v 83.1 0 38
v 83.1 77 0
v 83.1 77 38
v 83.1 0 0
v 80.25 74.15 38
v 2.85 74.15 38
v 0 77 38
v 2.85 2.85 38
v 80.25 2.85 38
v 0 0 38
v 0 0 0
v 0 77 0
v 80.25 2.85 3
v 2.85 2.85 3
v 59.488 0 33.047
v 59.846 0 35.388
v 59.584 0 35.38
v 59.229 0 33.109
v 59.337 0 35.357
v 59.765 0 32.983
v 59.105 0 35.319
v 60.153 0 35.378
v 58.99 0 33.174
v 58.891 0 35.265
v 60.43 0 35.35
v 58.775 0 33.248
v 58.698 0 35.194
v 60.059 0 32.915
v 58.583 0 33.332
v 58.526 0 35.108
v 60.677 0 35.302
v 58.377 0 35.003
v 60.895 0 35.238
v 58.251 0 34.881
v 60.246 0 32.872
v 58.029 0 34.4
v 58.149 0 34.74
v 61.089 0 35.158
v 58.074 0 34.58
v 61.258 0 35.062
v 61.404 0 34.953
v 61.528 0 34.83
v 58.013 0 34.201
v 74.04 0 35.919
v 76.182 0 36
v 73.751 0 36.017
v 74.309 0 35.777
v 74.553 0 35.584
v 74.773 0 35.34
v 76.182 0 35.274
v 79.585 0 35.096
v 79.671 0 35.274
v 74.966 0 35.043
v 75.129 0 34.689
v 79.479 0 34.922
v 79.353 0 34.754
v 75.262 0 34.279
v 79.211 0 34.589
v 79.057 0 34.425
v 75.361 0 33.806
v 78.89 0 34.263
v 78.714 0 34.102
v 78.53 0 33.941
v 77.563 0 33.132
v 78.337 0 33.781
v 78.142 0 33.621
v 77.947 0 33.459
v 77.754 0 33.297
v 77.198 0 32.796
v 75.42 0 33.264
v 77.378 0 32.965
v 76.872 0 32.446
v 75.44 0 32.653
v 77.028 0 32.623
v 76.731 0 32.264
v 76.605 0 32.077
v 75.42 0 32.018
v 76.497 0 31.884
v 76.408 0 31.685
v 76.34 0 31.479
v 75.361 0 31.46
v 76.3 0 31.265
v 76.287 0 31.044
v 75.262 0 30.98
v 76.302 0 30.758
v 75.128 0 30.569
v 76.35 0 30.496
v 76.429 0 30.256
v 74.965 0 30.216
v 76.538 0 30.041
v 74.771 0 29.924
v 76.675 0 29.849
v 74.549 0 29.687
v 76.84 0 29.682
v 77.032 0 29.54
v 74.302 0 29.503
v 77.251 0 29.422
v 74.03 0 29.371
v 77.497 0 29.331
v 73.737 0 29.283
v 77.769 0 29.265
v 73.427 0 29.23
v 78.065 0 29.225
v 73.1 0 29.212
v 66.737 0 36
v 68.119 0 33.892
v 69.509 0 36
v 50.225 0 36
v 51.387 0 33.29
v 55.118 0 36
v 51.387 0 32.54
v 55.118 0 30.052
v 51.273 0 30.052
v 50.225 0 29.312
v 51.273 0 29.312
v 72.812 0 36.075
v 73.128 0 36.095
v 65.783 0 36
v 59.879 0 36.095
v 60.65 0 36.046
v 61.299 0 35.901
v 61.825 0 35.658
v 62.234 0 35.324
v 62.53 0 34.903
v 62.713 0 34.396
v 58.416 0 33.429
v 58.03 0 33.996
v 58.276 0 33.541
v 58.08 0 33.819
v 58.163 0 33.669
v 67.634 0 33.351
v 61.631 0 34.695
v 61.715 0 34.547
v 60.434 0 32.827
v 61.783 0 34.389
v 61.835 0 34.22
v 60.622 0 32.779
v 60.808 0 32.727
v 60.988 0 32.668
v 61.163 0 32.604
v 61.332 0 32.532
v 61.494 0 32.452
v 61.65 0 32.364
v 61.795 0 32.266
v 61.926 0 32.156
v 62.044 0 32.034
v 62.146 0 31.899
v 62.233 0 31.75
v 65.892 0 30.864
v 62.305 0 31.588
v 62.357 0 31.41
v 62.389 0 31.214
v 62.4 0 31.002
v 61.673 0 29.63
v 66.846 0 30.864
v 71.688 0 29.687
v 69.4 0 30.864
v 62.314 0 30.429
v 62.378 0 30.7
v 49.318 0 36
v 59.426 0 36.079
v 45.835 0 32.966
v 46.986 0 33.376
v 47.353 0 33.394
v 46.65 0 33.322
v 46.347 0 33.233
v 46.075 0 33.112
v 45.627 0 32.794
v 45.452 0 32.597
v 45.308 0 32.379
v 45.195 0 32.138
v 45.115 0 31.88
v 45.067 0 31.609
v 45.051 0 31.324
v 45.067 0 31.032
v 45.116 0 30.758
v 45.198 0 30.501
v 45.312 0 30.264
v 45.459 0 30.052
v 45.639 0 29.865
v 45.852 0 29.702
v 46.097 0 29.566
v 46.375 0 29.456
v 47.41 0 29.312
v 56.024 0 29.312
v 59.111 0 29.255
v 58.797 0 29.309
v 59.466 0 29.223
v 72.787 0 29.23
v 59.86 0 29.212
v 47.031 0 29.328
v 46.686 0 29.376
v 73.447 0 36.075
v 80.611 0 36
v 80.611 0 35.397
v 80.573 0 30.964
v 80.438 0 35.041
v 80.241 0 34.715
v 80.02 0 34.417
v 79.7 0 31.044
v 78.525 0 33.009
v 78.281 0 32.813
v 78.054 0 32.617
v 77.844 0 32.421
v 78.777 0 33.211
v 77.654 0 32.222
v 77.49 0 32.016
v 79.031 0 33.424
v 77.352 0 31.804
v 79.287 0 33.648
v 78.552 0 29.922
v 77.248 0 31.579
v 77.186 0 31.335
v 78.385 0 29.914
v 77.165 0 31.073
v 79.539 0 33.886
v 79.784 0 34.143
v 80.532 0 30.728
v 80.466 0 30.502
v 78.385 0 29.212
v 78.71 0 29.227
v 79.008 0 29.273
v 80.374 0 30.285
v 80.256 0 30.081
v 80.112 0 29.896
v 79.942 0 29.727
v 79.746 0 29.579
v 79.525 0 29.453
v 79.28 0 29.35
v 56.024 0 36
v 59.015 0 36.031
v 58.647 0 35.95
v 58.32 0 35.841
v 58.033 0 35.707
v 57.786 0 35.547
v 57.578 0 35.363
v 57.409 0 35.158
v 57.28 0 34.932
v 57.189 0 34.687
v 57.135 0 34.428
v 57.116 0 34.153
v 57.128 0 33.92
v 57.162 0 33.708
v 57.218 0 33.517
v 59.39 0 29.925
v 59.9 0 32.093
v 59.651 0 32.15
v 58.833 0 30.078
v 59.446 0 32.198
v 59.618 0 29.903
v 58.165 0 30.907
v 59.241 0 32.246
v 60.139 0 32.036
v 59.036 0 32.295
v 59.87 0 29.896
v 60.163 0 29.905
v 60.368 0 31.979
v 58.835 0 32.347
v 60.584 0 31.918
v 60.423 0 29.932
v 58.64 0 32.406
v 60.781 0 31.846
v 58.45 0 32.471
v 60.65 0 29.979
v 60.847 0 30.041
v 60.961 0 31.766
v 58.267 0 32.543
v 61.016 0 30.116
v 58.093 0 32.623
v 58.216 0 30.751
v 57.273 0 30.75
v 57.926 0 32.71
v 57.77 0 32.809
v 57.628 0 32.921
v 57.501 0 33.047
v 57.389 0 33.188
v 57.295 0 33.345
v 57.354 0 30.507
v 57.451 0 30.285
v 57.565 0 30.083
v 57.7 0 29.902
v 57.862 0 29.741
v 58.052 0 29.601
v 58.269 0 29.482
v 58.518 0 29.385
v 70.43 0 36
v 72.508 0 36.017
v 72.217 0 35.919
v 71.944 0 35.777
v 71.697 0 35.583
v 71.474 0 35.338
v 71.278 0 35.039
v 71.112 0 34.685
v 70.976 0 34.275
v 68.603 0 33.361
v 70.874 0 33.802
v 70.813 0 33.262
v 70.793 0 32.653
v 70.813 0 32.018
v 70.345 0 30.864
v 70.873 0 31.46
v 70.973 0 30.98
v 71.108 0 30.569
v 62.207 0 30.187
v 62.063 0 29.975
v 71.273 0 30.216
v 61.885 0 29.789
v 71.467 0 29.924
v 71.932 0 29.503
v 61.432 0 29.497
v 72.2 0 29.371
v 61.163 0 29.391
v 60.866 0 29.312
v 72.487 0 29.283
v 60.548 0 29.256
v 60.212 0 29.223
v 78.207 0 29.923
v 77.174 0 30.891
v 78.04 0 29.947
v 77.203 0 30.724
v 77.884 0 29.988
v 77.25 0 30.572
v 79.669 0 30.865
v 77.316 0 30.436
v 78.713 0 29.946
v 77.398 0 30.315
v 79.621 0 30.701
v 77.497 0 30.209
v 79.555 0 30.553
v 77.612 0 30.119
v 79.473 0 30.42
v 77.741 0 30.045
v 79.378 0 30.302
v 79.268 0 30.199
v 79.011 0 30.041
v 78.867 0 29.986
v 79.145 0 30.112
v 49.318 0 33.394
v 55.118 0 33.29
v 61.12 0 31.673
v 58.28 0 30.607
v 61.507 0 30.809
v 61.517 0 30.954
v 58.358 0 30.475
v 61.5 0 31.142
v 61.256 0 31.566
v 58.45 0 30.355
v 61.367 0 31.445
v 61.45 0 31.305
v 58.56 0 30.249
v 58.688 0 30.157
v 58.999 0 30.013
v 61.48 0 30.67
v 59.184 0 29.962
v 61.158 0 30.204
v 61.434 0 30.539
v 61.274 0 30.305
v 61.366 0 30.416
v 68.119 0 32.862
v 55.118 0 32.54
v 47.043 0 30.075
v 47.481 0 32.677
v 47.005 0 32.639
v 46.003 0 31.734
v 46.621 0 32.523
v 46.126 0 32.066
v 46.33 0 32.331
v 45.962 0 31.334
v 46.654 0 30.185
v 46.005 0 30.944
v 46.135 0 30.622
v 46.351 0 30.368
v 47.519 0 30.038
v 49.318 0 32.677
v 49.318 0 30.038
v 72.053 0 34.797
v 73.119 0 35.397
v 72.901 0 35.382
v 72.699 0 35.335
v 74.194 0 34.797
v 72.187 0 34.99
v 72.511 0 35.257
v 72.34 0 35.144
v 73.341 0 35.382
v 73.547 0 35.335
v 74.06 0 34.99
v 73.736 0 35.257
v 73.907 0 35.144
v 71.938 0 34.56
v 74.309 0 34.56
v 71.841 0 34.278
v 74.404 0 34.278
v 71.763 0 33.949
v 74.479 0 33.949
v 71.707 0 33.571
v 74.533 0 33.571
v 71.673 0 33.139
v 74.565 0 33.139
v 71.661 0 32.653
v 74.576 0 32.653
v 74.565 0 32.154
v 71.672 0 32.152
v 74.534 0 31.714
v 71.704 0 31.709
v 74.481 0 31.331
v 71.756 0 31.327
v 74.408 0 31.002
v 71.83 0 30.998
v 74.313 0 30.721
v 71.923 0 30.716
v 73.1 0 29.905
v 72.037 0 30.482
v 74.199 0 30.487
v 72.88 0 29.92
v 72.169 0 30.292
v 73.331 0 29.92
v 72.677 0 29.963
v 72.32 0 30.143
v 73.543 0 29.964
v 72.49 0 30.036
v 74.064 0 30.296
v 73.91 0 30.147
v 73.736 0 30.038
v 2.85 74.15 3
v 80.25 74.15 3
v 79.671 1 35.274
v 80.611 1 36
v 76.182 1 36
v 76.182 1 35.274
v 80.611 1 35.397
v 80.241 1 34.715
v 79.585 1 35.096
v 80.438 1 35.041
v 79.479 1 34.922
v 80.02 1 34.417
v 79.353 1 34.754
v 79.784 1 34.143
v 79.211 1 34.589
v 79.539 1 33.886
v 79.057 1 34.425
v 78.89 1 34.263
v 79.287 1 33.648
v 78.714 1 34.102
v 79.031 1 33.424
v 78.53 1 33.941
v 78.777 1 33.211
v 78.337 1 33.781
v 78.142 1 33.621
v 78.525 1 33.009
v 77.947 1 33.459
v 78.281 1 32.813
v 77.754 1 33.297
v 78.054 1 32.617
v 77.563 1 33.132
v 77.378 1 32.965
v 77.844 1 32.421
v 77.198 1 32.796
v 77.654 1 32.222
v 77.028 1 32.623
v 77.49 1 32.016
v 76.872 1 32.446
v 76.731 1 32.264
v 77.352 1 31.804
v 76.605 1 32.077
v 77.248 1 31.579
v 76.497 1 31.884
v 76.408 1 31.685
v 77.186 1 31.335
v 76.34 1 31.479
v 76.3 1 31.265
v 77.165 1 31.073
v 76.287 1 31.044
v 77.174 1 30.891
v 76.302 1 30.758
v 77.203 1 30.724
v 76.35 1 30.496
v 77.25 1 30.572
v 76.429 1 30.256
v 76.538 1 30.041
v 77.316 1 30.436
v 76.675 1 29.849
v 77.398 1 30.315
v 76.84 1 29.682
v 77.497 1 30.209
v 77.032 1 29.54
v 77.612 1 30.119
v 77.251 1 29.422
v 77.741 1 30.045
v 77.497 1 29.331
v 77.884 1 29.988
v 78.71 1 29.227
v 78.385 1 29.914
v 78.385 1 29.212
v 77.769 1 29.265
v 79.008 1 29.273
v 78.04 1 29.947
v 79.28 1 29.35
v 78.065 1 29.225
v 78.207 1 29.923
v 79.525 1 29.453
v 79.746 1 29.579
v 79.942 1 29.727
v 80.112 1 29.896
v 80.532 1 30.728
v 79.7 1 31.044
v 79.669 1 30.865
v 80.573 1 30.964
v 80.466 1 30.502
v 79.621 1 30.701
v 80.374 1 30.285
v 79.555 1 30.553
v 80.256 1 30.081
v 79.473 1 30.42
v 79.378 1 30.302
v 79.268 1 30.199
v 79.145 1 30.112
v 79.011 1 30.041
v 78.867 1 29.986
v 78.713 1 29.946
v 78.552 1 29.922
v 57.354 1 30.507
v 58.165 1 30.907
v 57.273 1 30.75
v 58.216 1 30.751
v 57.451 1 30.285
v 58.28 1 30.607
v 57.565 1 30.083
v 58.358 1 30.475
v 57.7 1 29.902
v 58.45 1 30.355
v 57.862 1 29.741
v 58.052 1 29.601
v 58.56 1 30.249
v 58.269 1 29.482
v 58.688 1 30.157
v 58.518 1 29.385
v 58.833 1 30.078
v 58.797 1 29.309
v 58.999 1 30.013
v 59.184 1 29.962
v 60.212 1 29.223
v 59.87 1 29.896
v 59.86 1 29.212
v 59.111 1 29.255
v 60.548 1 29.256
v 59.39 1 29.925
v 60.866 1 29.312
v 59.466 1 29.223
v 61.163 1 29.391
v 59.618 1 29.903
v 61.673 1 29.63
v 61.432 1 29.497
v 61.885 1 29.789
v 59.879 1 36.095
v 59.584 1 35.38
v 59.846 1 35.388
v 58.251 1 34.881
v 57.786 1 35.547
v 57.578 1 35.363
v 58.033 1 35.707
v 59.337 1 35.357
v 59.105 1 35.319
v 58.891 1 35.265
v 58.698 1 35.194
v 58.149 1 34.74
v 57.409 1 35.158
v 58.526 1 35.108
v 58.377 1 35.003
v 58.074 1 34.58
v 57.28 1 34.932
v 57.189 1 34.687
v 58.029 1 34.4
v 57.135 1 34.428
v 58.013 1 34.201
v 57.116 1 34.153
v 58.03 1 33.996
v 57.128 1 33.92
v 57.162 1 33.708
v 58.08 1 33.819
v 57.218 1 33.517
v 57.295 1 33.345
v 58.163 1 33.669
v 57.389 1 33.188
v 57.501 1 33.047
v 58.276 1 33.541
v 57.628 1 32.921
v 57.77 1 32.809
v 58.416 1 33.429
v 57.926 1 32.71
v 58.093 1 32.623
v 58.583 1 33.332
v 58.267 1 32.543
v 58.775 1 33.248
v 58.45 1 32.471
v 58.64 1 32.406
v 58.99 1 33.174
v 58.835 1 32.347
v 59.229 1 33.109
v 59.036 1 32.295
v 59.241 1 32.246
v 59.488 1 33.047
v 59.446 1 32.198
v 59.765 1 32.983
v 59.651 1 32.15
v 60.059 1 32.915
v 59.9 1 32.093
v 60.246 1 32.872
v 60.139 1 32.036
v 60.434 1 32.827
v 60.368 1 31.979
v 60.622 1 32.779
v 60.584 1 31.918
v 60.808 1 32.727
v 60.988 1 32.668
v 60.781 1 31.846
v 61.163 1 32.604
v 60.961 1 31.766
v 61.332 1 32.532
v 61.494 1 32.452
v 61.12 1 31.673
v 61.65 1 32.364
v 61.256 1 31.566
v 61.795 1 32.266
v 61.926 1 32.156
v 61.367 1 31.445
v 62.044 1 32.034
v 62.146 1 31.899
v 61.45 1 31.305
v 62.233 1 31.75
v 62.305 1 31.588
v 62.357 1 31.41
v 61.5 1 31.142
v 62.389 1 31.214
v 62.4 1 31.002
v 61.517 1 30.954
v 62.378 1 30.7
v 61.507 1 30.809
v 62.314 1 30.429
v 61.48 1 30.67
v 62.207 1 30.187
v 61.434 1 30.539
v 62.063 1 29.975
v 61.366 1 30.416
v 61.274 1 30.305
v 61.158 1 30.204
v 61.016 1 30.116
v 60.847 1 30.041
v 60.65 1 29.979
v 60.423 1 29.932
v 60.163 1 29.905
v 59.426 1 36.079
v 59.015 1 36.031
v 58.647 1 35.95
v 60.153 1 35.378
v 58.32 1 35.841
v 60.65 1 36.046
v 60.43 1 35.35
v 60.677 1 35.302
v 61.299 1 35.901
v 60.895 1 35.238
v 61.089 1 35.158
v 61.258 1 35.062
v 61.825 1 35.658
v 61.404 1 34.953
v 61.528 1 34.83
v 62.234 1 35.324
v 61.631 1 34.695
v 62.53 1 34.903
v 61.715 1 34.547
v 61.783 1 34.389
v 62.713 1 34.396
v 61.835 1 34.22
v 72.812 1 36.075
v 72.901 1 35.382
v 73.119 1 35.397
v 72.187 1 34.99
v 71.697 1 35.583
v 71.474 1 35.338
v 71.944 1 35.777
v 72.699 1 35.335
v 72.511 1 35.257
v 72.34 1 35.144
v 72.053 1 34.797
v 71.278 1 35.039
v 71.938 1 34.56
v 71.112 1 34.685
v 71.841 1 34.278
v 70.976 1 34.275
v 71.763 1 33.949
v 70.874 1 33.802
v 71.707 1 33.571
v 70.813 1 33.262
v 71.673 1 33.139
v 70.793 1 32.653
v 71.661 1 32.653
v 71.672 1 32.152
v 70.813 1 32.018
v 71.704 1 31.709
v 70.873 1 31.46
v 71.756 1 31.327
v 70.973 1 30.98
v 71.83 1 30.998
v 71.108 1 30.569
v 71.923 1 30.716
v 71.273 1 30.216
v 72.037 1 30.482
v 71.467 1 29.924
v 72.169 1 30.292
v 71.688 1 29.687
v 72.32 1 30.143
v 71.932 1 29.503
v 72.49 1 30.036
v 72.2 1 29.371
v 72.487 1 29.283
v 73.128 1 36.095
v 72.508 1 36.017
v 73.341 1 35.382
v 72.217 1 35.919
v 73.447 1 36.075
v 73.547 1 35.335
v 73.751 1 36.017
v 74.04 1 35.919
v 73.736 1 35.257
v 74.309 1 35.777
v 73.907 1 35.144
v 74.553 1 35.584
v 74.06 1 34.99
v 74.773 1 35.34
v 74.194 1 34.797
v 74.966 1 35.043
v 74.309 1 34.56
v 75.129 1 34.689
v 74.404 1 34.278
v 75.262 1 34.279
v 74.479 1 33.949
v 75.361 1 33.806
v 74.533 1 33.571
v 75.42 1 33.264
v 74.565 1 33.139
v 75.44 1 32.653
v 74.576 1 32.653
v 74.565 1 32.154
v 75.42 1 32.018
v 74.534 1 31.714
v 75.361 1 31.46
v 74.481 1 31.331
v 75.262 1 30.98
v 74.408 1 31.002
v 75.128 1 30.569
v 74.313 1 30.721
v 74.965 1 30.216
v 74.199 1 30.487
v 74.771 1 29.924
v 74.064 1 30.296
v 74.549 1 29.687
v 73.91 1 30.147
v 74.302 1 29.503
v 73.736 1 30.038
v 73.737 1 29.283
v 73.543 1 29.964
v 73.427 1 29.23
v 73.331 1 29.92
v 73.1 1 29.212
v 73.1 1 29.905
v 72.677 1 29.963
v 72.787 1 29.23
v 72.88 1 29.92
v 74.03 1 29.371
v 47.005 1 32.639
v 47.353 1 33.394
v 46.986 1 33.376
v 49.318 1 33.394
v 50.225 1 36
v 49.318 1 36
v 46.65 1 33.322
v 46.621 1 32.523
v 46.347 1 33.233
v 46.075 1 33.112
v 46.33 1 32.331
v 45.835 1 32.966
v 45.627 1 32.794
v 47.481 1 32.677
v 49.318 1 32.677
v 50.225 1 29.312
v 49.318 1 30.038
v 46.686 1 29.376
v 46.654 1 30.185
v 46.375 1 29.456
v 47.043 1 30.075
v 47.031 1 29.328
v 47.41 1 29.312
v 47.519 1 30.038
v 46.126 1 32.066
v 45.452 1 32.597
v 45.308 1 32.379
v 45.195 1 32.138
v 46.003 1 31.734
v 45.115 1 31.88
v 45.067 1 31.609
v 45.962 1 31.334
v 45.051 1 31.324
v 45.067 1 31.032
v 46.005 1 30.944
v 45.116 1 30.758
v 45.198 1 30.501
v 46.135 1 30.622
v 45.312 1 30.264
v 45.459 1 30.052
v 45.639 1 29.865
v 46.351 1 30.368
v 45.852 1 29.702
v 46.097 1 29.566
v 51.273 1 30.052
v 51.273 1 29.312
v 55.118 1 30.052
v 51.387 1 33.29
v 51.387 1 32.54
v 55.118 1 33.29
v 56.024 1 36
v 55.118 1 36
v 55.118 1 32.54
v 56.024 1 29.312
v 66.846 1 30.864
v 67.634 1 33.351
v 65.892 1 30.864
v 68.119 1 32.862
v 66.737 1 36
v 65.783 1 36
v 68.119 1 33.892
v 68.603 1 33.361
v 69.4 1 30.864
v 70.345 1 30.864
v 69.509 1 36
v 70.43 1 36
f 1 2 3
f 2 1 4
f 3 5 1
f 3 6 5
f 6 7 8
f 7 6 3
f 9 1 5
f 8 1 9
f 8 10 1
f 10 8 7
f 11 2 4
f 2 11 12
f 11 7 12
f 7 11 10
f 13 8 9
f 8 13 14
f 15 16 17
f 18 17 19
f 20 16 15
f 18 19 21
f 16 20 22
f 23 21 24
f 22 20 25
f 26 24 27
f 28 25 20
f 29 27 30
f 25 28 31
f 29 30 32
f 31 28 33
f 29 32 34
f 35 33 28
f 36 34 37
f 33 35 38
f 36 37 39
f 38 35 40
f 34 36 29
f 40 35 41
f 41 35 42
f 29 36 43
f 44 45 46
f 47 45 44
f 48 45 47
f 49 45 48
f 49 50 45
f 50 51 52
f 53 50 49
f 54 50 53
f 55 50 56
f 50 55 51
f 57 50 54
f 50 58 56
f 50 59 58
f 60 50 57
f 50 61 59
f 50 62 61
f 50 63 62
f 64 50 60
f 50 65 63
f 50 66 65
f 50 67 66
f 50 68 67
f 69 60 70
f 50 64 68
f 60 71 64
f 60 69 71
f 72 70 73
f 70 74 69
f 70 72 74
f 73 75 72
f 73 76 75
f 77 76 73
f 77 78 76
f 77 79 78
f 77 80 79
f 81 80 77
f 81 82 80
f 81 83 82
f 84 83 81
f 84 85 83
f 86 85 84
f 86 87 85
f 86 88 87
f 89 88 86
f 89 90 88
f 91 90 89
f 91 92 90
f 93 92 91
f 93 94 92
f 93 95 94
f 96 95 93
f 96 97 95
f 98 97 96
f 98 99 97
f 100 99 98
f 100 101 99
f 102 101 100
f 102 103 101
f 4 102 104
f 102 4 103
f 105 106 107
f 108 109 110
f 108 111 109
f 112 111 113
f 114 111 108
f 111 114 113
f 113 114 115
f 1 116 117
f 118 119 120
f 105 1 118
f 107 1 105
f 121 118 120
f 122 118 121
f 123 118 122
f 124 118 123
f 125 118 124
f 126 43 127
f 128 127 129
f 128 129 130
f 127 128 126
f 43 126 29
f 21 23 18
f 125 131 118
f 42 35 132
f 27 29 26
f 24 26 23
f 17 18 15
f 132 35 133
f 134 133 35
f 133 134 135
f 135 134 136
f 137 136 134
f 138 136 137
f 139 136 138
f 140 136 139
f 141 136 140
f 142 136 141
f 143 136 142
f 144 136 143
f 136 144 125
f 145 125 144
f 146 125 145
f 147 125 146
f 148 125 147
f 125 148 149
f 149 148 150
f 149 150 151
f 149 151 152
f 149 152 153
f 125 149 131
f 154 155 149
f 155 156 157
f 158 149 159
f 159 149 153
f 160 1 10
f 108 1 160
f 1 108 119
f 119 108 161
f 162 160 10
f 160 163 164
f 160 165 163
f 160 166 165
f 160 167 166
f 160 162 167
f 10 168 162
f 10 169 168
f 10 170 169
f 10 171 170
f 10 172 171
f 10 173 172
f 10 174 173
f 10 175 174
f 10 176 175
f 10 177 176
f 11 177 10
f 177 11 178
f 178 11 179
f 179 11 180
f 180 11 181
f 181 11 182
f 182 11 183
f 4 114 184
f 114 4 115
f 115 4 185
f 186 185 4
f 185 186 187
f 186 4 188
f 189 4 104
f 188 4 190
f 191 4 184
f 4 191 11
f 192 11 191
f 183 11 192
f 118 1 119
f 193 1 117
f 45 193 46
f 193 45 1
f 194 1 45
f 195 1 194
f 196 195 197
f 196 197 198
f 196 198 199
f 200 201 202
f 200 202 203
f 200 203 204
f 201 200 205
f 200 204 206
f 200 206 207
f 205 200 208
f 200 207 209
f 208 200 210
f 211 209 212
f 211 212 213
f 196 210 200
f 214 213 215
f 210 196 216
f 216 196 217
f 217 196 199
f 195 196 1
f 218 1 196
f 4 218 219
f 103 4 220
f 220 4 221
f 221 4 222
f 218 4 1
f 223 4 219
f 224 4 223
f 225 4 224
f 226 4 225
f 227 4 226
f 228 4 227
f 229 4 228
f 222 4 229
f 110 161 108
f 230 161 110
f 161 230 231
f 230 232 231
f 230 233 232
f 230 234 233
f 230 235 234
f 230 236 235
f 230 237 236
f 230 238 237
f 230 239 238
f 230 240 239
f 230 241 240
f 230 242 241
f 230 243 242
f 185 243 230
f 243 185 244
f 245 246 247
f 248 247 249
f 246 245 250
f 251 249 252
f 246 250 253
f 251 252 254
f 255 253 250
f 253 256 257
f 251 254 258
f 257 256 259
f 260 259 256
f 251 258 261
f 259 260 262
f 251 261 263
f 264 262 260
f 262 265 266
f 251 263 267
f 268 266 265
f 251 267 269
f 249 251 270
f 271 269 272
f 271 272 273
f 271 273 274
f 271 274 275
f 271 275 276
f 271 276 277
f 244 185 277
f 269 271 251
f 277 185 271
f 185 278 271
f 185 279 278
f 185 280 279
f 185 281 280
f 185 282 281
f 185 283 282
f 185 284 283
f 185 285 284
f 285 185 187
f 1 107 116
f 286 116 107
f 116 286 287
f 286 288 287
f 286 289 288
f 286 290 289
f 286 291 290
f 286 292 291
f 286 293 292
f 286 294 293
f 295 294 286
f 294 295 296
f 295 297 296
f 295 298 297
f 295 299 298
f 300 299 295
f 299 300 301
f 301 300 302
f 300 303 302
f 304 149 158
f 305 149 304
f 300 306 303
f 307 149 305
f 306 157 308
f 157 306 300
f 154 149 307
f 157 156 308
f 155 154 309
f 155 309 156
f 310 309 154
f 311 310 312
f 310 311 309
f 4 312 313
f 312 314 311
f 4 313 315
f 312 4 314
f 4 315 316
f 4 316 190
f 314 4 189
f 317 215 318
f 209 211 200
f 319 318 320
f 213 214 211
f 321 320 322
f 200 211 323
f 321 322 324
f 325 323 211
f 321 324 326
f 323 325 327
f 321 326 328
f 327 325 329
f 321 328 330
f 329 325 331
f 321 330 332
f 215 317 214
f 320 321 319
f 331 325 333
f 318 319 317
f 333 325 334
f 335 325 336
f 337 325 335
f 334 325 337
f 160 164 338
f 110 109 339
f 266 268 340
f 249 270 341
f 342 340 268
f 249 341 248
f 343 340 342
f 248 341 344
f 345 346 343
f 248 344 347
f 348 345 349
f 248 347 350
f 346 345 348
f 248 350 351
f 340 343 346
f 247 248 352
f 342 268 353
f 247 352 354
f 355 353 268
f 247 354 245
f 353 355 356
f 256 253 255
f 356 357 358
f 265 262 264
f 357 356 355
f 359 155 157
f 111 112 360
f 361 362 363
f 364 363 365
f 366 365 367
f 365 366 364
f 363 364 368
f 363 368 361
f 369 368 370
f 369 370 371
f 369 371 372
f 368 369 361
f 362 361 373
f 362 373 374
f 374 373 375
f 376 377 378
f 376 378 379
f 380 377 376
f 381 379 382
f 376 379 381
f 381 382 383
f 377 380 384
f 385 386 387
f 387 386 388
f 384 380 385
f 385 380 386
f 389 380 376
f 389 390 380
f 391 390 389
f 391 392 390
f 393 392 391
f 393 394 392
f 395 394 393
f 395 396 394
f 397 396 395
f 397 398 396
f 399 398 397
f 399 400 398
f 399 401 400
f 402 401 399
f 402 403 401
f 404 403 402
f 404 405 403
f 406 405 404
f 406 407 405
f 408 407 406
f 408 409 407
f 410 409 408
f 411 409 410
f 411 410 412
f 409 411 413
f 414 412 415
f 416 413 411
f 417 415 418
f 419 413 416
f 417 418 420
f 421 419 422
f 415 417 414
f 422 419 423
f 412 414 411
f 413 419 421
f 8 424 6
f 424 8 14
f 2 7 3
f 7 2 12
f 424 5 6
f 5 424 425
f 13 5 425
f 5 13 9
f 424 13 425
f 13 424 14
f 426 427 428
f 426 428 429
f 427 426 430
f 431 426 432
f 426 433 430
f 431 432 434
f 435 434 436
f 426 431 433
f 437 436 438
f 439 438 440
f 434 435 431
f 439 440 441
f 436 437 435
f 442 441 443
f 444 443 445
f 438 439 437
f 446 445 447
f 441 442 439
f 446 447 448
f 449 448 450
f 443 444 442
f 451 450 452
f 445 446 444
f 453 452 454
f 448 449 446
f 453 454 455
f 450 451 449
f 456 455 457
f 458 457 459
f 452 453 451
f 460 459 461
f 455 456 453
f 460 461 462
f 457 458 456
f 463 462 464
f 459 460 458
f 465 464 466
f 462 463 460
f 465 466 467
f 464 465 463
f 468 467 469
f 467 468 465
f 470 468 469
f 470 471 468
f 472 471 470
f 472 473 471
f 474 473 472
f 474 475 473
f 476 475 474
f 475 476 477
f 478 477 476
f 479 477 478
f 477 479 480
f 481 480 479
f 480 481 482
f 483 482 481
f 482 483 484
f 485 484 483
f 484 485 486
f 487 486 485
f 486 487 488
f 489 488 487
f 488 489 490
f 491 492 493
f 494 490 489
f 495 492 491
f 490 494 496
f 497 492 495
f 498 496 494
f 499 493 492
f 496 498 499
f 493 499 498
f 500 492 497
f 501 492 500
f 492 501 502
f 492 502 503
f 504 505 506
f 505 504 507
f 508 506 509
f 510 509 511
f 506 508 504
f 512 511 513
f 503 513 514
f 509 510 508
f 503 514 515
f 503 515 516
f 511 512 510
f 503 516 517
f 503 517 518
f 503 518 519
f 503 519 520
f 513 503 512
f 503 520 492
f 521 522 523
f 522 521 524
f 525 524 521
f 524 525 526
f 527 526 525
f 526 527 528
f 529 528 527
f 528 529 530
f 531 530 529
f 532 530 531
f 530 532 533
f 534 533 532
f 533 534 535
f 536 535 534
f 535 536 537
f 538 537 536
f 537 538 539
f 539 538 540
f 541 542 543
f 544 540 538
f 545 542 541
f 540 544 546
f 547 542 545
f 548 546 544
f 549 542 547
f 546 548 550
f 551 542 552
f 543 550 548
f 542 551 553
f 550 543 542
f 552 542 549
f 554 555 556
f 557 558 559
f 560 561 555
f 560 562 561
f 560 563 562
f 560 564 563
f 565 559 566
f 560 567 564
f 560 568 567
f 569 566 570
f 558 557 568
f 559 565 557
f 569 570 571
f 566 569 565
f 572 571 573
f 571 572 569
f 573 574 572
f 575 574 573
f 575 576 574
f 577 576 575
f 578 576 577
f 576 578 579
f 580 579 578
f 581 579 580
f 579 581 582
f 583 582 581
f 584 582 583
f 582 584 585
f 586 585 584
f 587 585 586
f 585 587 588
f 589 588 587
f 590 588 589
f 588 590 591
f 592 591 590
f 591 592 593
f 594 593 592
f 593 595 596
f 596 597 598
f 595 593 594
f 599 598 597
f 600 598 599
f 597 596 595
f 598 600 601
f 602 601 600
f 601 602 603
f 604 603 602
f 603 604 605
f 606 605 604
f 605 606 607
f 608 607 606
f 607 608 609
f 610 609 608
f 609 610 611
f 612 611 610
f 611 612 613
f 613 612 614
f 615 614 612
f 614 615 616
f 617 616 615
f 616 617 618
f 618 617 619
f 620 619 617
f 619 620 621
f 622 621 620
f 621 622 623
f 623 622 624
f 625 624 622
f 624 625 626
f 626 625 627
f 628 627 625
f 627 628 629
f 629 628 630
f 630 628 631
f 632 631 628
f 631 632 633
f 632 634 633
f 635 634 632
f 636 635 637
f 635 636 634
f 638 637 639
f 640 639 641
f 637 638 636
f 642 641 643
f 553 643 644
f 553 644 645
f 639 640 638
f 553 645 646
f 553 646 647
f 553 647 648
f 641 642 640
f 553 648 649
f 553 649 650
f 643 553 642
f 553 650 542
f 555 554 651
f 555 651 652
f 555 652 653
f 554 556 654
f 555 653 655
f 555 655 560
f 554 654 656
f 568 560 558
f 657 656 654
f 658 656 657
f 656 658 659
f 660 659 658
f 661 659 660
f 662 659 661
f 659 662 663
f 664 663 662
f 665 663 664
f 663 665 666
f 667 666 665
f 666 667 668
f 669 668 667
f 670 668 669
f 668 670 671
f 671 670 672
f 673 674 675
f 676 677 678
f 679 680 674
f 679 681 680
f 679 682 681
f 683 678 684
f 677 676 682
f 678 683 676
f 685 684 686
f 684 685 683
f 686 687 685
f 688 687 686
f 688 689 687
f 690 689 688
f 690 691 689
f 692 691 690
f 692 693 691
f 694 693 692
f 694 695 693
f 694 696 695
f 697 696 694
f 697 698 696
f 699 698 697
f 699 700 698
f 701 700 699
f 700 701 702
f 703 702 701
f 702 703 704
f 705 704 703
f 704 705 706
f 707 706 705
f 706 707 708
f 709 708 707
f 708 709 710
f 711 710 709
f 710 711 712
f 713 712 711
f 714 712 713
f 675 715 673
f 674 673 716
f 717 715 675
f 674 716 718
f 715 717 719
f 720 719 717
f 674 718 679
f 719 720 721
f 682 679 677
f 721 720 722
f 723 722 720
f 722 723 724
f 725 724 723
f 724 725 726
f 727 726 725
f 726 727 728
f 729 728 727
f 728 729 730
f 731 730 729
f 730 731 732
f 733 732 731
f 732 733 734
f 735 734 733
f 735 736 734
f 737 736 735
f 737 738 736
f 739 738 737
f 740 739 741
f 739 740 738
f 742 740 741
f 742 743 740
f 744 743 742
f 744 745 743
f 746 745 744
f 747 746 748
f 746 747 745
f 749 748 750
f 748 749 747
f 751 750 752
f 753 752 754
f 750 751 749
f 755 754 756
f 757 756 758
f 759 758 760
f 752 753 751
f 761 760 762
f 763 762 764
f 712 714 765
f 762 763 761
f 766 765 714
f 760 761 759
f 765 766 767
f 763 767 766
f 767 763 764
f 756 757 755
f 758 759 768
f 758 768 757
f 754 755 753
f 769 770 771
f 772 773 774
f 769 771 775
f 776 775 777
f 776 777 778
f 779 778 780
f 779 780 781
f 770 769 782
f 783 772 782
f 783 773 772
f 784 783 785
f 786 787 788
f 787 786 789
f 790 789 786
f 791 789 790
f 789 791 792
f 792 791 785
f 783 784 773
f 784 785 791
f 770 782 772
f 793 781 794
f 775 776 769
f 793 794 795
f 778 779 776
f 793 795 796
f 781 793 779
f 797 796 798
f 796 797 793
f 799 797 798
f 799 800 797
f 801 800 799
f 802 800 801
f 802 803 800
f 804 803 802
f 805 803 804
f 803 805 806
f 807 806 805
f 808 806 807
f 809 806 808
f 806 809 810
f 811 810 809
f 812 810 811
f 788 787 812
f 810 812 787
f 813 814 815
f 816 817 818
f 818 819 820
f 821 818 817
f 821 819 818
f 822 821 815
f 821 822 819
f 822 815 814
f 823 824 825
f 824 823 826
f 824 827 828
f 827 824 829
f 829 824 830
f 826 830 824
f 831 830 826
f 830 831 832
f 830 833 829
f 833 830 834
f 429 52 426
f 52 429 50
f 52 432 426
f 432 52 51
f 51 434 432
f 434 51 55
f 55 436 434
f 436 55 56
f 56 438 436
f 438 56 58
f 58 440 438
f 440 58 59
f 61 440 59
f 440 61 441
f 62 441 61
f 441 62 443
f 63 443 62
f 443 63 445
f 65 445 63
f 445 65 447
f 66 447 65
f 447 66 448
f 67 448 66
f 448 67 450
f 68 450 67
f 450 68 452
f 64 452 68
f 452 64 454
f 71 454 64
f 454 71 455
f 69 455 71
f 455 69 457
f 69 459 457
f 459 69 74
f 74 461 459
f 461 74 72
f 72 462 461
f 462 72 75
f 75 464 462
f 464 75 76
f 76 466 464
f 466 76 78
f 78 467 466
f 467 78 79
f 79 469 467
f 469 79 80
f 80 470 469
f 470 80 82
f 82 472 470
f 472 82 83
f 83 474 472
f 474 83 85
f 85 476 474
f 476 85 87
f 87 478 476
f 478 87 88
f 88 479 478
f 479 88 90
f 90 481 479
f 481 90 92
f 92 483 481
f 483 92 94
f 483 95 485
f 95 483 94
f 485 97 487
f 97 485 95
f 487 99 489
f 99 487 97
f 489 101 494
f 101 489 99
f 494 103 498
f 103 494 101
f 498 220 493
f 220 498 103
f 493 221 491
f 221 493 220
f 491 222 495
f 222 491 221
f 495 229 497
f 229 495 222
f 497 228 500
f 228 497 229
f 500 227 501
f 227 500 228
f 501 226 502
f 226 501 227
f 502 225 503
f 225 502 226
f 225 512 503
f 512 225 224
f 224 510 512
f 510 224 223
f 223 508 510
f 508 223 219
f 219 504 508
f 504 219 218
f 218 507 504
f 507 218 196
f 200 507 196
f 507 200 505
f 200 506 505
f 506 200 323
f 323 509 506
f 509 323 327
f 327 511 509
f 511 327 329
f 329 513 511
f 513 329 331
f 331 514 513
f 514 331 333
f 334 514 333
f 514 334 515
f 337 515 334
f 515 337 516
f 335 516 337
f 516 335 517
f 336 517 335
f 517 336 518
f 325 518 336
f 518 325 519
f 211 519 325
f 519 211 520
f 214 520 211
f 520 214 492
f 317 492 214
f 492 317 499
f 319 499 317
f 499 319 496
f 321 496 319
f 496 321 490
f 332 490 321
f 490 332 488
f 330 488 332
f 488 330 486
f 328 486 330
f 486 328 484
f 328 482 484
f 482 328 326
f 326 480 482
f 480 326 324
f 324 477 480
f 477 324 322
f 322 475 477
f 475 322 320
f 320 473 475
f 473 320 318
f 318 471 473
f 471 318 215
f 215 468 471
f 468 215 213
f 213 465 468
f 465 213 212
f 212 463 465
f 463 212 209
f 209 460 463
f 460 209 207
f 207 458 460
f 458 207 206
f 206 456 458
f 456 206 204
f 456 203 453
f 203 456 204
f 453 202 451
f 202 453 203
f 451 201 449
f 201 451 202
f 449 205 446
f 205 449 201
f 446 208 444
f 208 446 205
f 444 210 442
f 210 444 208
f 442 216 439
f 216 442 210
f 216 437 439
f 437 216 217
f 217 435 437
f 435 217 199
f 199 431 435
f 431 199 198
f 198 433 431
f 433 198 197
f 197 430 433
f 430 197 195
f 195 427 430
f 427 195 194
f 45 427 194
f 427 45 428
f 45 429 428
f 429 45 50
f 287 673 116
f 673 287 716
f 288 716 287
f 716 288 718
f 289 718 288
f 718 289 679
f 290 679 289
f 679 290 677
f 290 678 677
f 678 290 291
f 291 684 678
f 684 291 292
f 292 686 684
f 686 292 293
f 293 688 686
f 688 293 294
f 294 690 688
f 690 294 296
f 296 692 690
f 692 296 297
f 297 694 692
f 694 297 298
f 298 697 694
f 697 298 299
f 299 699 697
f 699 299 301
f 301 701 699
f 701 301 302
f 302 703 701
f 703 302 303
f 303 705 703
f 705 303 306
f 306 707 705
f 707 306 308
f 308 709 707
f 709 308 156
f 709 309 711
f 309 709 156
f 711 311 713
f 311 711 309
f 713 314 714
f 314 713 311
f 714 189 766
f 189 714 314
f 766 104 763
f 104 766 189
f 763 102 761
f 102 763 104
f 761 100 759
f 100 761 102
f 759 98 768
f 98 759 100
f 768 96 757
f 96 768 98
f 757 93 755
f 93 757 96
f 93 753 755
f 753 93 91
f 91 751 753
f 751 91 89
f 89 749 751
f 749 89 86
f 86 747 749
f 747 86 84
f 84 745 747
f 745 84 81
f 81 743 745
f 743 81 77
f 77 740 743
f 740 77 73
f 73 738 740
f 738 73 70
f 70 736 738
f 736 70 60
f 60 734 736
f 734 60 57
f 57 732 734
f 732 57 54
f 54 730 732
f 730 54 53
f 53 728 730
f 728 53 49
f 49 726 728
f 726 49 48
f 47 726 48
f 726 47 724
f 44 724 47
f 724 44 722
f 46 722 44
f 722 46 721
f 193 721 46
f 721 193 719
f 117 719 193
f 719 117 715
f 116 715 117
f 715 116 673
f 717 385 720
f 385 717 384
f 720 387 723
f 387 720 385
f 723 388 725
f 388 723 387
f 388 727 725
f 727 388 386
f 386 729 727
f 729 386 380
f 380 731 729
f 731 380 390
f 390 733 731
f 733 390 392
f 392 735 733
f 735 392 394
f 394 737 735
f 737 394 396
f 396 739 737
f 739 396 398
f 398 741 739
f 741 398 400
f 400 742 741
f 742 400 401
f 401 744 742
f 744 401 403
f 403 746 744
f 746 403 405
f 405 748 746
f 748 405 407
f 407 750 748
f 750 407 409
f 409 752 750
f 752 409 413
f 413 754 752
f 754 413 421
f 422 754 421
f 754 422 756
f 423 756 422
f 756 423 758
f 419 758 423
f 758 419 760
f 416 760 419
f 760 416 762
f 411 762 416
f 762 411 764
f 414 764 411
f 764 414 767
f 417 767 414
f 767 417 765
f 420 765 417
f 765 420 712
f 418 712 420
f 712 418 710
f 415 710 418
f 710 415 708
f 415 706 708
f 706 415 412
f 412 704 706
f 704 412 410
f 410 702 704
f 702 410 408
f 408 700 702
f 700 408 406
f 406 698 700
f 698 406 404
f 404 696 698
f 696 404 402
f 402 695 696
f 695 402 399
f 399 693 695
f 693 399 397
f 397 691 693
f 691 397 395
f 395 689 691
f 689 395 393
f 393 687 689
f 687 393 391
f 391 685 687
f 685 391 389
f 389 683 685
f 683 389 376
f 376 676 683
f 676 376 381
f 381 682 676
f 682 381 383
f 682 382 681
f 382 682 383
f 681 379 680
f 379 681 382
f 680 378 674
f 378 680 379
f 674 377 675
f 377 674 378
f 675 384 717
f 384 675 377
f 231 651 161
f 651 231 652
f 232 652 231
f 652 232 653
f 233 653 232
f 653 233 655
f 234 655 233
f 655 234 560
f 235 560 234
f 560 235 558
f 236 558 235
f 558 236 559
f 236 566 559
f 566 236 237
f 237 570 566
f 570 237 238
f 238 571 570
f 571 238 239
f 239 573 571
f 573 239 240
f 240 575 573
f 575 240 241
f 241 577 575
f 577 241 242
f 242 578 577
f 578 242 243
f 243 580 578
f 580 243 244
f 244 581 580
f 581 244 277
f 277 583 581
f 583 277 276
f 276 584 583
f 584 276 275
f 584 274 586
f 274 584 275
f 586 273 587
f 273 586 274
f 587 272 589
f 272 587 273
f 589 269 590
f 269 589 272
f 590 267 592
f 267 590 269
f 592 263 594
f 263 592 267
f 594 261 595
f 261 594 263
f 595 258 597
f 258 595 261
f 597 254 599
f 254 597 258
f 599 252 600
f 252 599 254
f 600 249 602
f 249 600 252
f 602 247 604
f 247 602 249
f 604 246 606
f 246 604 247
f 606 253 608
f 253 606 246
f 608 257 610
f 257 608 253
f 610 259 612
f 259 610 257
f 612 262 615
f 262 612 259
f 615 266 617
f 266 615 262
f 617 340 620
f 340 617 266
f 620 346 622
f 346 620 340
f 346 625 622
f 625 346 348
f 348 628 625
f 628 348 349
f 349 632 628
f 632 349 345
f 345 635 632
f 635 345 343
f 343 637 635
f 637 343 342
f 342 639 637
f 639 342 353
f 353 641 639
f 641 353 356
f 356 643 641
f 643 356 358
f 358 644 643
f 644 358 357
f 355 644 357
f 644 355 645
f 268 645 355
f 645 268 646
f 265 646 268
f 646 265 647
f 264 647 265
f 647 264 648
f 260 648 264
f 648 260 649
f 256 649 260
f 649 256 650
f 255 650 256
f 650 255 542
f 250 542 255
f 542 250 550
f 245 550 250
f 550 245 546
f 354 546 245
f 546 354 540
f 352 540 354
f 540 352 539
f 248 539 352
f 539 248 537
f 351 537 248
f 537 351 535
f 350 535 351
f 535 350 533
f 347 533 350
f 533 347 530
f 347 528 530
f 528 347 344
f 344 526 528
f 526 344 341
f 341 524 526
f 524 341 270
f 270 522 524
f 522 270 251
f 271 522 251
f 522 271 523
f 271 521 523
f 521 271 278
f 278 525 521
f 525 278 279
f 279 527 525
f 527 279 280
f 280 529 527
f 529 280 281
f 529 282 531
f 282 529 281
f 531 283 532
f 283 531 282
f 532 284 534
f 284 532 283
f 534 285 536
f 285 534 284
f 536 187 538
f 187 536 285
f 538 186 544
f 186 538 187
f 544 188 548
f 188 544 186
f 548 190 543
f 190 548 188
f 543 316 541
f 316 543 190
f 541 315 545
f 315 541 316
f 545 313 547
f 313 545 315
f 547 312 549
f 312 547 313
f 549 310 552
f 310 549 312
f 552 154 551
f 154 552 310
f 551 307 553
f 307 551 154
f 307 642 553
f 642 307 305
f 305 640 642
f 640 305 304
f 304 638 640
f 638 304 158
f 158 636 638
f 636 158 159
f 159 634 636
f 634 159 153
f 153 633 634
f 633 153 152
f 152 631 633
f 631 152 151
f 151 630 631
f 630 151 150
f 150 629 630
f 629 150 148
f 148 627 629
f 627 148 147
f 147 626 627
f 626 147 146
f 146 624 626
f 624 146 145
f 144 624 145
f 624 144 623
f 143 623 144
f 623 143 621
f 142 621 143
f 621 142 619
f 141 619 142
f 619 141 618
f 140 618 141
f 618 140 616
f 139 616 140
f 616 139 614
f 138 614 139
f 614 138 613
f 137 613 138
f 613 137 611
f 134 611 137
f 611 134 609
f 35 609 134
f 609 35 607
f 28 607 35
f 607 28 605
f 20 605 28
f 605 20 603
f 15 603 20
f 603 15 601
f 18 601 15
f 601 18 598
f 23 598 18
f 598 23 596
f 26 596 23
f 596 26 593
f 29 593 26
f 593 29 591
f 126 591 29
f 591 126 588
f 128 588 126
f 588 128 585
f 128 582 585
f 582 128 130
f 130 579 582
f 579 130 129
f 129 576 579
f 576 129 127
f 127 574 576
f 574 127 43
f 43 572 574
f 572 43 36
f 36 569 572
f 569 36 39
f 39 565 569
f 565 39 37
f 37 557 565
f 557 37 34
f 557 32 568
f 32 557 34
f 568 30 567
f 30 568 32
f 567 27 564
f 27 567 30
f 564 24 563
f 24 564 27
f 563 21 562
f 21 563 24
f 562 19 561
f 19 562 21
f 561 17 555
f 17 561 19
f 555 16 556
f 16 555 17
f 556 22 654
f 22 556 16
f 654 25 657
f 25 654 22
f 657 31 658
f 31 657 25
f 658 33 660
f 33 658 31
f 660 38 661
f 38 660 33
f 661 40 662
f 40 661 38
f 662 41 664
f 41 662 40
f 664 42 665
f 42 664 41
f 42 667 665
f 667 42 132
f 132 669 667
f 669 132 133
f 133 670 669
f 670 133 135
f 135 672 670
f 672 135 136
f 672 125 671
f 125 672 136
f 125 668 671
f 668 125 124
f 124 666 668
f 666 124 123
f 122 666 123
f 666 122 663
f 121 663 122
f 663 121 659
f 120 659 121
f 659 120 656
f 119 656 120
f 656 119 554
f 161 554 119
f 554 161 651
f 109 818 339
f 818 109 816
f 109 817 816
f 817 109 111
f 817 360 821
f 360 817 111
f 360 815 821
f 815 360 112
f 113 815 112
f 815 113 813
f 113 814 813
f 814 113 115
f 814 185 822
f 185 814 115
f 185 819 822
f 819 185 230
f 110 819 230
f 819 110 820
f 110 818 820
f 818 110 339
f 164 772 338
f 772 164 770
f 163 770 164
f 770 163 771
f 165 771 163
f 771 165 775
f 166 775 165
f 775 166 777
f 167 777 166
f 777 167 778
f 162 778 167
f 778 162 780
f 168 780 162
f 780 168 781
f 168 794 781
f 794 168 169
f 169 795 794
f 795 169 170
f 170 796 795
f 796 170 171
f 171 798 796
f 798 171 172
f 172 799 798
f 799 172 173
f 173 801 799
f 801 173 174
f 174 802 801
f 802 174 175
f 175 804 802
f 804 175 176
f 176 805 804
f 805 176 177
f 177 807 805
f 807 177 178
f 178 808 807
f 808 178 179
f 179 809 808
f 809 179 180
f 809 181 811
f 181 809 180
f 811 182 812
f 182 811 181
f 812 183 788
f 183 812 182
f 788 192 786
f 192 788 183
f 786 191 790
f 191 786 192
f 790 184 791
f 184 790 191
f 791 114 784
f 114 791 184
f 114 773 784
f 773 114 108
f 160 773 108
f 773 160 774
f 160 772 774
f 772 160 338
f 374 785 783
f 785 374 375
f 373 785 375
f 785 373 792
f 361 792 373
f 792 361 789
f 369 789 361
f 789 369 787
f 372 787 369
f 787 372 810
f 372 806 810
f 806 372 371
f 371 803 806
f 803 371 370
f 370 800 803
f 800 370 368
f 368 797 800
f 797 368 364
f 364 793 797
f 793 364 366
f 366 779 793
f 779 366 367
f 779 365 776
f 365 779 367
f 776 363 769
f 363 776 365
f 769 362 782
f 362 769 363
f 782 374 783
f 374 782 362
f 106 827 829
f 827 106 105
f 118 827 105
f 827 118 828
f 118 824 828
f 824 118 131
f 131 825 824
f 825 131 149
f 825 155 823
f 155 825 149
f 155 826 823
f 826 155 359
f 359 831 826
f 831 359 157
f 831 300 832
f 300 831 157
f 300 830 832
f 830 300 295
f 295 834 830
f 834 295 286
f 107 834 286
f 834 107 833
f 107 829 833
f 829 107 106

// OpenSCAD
// TODO:
// - Think about hinged lid with circular cut in front, but only inner side
// - lid tolerance
// - connect tolerance

// my sfp measurements:
// port width 14
// port height 9
//              gbic    sfp+        base T
// sfp width    13.4    13.7        13.7
// sfp height   8.6     8.6         8.6
// sfp len      47.5    47.5        47.5
// sfp head len 12      12          ~25
// sfp head h   12      12          14      y=2.5+w=0.65 up,
// sfp head w   14.2    14.2        ??
//   (to flare)

// Can be used to compensate for inaccurate printers :)

// Widen holes by this amount of mm.
printer_xy_slack = 0.3;
printer_z_slack = 0;

// Cols and rows of SFPs
sfp_col=5;
sfp_row=4;

//bottom("sfp");
top("sfp");

// margin between text and nearest corner/limit
// also controls text size on the top side.
top_text_margin = 1;
lid_text_margin = 2;
bottom_text_margin = 2;
// text size, in mm text height
lid_text_size = 7;
bottom_text_size = 3;
// text depth, how far it extrudes into the body
bottom_text_depth = 0.5;



// paper slot, for describing what's in the box
// how far the lip extends
paperslot_lip_size = 4;
// how wide the lip is
paperslot_lip_t = 1;
// how wide the space behind is
paperslot_space_t = 0.5;

// how many mm to spare for the
interlock_stop_buffer = 5;
// 2 layers z slack. 1 on each on 0.3
interlock_z_tolerance = 0.6;
interlock_xy_tolerance = printer_xy_slack;

// SFP MSA: http://www.schelto.com/SFP/SFP%20MSA.pdf, page 6.
sfp_latch_depth = 2.5; // V, page 6.
sfp_latch_height = 0.45; // Z, page 6
sfp_latch_width = 2.6; // AF, page 6
sfp_latch_length = 2.6; // AB, page 6
// S+V gives the real height, 45+2.5 = 47.5
// we'll make it so that we do not conflict with the latch.

// SFPs are 8.6 x 13.7. (A,B)
// Tolerances are ±0.1
// printer tolerance was ±0.1, but removing that because of loose fit.
// In the back, SFPs are supposed to get more narrow, to 8.5 x 13.4. (C,D). But that's not necessary to model here.
sfp_slot_height = 8.6 + 0.1 + printer_xy_slack;
sfp_slot_width = 13.7 + 0.1 + printer_xy_slack;
sfp_slot_len = 47.5 + 0.25 + printer_z_slack;
// S+V=47.5. S+V tolerances: .25.

qsfp_slot_height = 8.6 + 0.1 + printer_xy_slack;
qsfp_slot_width = 18.35 + 0.1 + printer_xy_slack;
qsfp_slot_len = 47.5 + 0.25 + printer_z_slack;


// 14 usual, got a comment that GLC-T needs some more space
sfp_head_height = 16;
// we need 1.5mm extra to make a solid wall
sfp_head_width = 15.2;
// Copper SFP+: tried it, it was 23 or something
sfp_head_len = 25;

// 14 usual, got a comment that GLC-T needs some more space
qsfp_head_height = 16;
// we need 1.5mm extra to make a solid wall
qsfp_head_width = 20.15;
qsfp_head_len = 25;

// height and thickness of the lid lip
lid_lip_h = 10;
// lid slack, millimeters it can move while on, theoretically
// removes this many millimeters from the inside of the lid.
lid_tolerance = printer_xy_slack;

// thickness of walls
wall_t = 3;



// how much space from one SFP to the next
sfp_x_space = sfp_head_width - sfp_slot_width;
sfp_y_space = sfp_head_height - sfp_slot_height;

qsfp_x_space = qsfp_head_width - qsfp_slot_width;
qsfp_y_space = qsfp_head_height - qsfp_slot_height;

GLITCH = .1;

function get_tot_z(sfp_type) = (sfp_type=="sfp" ? sfp_slot_len : qsfp_slot_len) + wall_t;
function get_tot_x(sfp_type) = 2*wall_t + (sfp_type=="sfp" ?
    (sfp_col*sfp_head_width + sfp_x_space) :
    (sfp_col*qsfp_head_width + qsfp_x_space));
function get_tot_y(sfp_type) = 2*wall_t + (sfp_type=="sfp" ?
    (sfp_row*sfp_head_height + sfp_y_space) :
    (sfp_row*qsfp_head_height + qsfp_y_space));


// fake sfp module, use this for testing lids
module sfp_head_box(sfp_type) {
    color([.8,.2,.2])
    translate([wall_t+sfp_x_space/2,wall_t+sfp_y_space/2,get_tot_z(sfp_type)])
    cube([sfp_head_width, sfp_head_height, sfp_head_len-2]);
}


module sfp(x,y,sfp_type){
    latch_z = sfp_latch_depth + sfp_latch_length;
    color([.9,.9,1])
    translate([x,y,0]) {
        // main
        cube([sfp_slot_width,sfp_slot_height,sfp_slot_len+.1]);
        // remove latch area
        translate([
            (sfp_slot_width-sfp_latch_width)/2,
            (-sfp_latch_height),
            (sfp_slot_len-latch_z)])
        cube([sfp_latch_width, sfp_latch_height+0.1, latch_z+0.1]);
        // text
        sfp_text(x/sfp_head_width, y/sfp_head_height, sfp_type);
    }
}

module qsfp(x,y,sfp_type){
    latch_z = sfp_latch_depth + sfp_latch_length;
    color([.9,.9,1])
    translate([x,y,0]) {
        // main
        cube([qsfp_slot_width,qsfp_slot_height,sfp_slot_len+.1]);
        // remove latch area
        translate([
            (qsfp_slot_width-sfp_latch_width)/2,
            (-sfp_latch_height),
            (qsfp_slot_len-latch_z)])
        cube([sfp_latch_width, sfp_latch_height+0.1, latch_z+0.1]);
        // text
        sfp_text(x/qsfp_head_width, y/qsfp_head_height, sfp_type);
    }
}

module lid_text(sx, sz, sfp_type) {
    text_height = lid_text_size;
    text_extends = 1;
    txt = sfp_type == "sfp" ? "x SFP" : "x QSFP";

    _str = str(sfp_col*sfp_row, txt);

    translate([ sx-lid_text_margin,
                text_extends,
                sz-lid_text_margin])
        rotate([90,180,0])
        linear_extrude(text_extends+GLITCH)
        text(_str, size=text_height);
}

module sfp_text(c, r, sfp_type) {
    // inverse row and add 1
    r = sfp_row - r;
    // add 1 to col
    c = c + 1;
    text_extends = 1;
    text_height = sfp_y_space-2*top_text_margin;

    translate([0,sfp_slot_height+top_text_margin,get_tot_z(sfp_type)-text_extends-wall_t])
    rotate([0,0,0])
        linear_extrude(text_extends+.1)
        text(str(c, chr(64+r)), size=text_height);
}

module bottom_text(paper_dim_x, paper_dim_y){
    _txt = str("Use ", paper_dim_x, " x ",
               paper_dim_y, " mm papers");
    
    translate([ bottom_text_margin,
                bottom_text_margin+bottom_text_size,
                bottom_text_depth])
    rotate([180,0,0])
        linear_extrude(bottom_text_depth)
        text(_txt, size=bottom_text_size);
}

module gbics(sfp_col,sfp_row,sfp_type){
    for(x = [0 : sfp_head_width : sfp_col*sfp_head_width-0.1]){
        for(y = [0 : sfp_head_height : sfp_row*sfp_head_height-0.1]){
            sfp(x,y,sfp_type);
        }
    }
}

module qsfps(sfp_col,sfp_row,sfp_type){
    for(x = [0 : qsfp_head_width : sfp_col*qsfp_head_width-0.1]){
        for(y = [0 : qsfp_head_height : sfp_row*qsfp_head_height-0.1]){
            qsfp(x,y,sfp_type);
        }
    }
}

// interlocking mechanism
module chaining_v(height, innerw, outerw, depth) {
    linear_extrude(height)
        polygon([
            [0,-innerw/2],
            [0,innerw/2],
            [depth, outerw/2],
            [depth, -outerw/2]]);

}
module paperslot(sfp_type) {
    inner_x = get_tot_x(sfp_type) - 2*wall_t;
    inner_z = get_tot_z(sfp_type) - lid_lip_h - wall_t;

    bottom_text(inner_x, inner_z);

    translate([wall_t, paperslot_lip_t, wall_t])
        cube([inner_x, paperslot_space_t, inner_z]);

    lip_x = inner_x - 2*paperslot_lip_size;
    lip_z = inner_z - paperslot_lip_size;

    translate([wall_t+paperslot_lip_size, 0, wall_t+paperslot_lip_size])
        cube([lip_x, paperslot_lip_t, lip_z]);
}

module box(sfp_col,sfp_row,sfp_type="sfp"){
    tot_z = get_tot_z(sfp_type);
    tot_y = get_tot_y(sfp_type);
    
    chaining_v_h = tot_z-lid_lip_h-5;
    difference(){
        union() {
            cube([get_tot_x(sfp_type),tot_y,tot_z]);
            translate([get_tot_x(sfp_type),tot_y/2,-.1])
                chaining_v(chaining_v_h+.1-interlock_z_tolerance/2,
                            5-interlock_xy_tolerance/2,
                            7-interlock_xy_tolerance/2,
                            wall_t-interlock_xy_tolerance/2);
        }
        translate([ wall_t+(sfp_x_space),
                    wall_t+(sfp_y_space),
                    wall_t])
            //gbics(sfp_col,sfp_row);
            if(sfp_type == "sfp") {
                gbics(sfp_col, sfp_row, sfp_type);
            } else {
                qsfps(sfp_col,sfp_row, sfp_type);
            }
        lid_cut(sfp_type);
        // allow for 5mm interlock stop
        translate([0,tot_y/2,-.1])
            chaining_v(chaining_v_h+.1+interlock_z_tolerance/2,
                        5+interlock_xy_tolerance/2,
                        7+interlock_xy_tolerance/2,
                        wall_t+interlock_xy_tolerance/2);
        // space for paper
        paperslot(sfp_type);
    }
}



module lid_cut(sfp_type){
    tot_z = get_tot_z(sfp_type);
    tot_x = get_tot_x(sfp_type);
    tot_y = get_tot_y(sfp_type);
    // lid spacings
    translate([0,0,tot_z - lid_lip_h]){
        // x wall, near
        translate([-1.,-.1,0])
            cube([tot_x+.2,wall_t+.1,lid_lip_h+.1]);
        // y wall, near
        translate([-.1,-.1,0])
        cube([wall_t+.1,tot_y+.2,lid_lip_h+.1]);
        // x wall, far
        translate([0,tot_y-wall_t,0])
            cube([tot_x,wall_t+.1,lid_lip_h+.1]);
        // y wall, far
        translate([tot_x-wall_t,0,0])
            cube([wall_t+.1,tot_y,lid_lip_h+.1]);
    }
}

module bottom(sfp_type="sfp") {
    box(sfp_col,sfp_row,sfp_type);
}
module top(sfp_type) {
    tot_x = get_tot_x(sfp_type);
    tot_y = get_tot_y(sfp_type);
    
    
    h=sfp_head_len + wall_t + lid_lip_h;
    t = wall_t - lid_tolerance/2;
    difference() {
        union() {
            cube([tot_x,t,h]);
            cube([t,tot_y,h]);
            translate([0,tot_y-t,0])
                cube([tot_x,t,h]);
            translate([tot_x-t,0,0])
                cube([t,tot_y,h]);

            cube([tot_x,tot_y,wall_t]);
        }
        lid_text(tot_x, h, sfp_type);
    }
}
